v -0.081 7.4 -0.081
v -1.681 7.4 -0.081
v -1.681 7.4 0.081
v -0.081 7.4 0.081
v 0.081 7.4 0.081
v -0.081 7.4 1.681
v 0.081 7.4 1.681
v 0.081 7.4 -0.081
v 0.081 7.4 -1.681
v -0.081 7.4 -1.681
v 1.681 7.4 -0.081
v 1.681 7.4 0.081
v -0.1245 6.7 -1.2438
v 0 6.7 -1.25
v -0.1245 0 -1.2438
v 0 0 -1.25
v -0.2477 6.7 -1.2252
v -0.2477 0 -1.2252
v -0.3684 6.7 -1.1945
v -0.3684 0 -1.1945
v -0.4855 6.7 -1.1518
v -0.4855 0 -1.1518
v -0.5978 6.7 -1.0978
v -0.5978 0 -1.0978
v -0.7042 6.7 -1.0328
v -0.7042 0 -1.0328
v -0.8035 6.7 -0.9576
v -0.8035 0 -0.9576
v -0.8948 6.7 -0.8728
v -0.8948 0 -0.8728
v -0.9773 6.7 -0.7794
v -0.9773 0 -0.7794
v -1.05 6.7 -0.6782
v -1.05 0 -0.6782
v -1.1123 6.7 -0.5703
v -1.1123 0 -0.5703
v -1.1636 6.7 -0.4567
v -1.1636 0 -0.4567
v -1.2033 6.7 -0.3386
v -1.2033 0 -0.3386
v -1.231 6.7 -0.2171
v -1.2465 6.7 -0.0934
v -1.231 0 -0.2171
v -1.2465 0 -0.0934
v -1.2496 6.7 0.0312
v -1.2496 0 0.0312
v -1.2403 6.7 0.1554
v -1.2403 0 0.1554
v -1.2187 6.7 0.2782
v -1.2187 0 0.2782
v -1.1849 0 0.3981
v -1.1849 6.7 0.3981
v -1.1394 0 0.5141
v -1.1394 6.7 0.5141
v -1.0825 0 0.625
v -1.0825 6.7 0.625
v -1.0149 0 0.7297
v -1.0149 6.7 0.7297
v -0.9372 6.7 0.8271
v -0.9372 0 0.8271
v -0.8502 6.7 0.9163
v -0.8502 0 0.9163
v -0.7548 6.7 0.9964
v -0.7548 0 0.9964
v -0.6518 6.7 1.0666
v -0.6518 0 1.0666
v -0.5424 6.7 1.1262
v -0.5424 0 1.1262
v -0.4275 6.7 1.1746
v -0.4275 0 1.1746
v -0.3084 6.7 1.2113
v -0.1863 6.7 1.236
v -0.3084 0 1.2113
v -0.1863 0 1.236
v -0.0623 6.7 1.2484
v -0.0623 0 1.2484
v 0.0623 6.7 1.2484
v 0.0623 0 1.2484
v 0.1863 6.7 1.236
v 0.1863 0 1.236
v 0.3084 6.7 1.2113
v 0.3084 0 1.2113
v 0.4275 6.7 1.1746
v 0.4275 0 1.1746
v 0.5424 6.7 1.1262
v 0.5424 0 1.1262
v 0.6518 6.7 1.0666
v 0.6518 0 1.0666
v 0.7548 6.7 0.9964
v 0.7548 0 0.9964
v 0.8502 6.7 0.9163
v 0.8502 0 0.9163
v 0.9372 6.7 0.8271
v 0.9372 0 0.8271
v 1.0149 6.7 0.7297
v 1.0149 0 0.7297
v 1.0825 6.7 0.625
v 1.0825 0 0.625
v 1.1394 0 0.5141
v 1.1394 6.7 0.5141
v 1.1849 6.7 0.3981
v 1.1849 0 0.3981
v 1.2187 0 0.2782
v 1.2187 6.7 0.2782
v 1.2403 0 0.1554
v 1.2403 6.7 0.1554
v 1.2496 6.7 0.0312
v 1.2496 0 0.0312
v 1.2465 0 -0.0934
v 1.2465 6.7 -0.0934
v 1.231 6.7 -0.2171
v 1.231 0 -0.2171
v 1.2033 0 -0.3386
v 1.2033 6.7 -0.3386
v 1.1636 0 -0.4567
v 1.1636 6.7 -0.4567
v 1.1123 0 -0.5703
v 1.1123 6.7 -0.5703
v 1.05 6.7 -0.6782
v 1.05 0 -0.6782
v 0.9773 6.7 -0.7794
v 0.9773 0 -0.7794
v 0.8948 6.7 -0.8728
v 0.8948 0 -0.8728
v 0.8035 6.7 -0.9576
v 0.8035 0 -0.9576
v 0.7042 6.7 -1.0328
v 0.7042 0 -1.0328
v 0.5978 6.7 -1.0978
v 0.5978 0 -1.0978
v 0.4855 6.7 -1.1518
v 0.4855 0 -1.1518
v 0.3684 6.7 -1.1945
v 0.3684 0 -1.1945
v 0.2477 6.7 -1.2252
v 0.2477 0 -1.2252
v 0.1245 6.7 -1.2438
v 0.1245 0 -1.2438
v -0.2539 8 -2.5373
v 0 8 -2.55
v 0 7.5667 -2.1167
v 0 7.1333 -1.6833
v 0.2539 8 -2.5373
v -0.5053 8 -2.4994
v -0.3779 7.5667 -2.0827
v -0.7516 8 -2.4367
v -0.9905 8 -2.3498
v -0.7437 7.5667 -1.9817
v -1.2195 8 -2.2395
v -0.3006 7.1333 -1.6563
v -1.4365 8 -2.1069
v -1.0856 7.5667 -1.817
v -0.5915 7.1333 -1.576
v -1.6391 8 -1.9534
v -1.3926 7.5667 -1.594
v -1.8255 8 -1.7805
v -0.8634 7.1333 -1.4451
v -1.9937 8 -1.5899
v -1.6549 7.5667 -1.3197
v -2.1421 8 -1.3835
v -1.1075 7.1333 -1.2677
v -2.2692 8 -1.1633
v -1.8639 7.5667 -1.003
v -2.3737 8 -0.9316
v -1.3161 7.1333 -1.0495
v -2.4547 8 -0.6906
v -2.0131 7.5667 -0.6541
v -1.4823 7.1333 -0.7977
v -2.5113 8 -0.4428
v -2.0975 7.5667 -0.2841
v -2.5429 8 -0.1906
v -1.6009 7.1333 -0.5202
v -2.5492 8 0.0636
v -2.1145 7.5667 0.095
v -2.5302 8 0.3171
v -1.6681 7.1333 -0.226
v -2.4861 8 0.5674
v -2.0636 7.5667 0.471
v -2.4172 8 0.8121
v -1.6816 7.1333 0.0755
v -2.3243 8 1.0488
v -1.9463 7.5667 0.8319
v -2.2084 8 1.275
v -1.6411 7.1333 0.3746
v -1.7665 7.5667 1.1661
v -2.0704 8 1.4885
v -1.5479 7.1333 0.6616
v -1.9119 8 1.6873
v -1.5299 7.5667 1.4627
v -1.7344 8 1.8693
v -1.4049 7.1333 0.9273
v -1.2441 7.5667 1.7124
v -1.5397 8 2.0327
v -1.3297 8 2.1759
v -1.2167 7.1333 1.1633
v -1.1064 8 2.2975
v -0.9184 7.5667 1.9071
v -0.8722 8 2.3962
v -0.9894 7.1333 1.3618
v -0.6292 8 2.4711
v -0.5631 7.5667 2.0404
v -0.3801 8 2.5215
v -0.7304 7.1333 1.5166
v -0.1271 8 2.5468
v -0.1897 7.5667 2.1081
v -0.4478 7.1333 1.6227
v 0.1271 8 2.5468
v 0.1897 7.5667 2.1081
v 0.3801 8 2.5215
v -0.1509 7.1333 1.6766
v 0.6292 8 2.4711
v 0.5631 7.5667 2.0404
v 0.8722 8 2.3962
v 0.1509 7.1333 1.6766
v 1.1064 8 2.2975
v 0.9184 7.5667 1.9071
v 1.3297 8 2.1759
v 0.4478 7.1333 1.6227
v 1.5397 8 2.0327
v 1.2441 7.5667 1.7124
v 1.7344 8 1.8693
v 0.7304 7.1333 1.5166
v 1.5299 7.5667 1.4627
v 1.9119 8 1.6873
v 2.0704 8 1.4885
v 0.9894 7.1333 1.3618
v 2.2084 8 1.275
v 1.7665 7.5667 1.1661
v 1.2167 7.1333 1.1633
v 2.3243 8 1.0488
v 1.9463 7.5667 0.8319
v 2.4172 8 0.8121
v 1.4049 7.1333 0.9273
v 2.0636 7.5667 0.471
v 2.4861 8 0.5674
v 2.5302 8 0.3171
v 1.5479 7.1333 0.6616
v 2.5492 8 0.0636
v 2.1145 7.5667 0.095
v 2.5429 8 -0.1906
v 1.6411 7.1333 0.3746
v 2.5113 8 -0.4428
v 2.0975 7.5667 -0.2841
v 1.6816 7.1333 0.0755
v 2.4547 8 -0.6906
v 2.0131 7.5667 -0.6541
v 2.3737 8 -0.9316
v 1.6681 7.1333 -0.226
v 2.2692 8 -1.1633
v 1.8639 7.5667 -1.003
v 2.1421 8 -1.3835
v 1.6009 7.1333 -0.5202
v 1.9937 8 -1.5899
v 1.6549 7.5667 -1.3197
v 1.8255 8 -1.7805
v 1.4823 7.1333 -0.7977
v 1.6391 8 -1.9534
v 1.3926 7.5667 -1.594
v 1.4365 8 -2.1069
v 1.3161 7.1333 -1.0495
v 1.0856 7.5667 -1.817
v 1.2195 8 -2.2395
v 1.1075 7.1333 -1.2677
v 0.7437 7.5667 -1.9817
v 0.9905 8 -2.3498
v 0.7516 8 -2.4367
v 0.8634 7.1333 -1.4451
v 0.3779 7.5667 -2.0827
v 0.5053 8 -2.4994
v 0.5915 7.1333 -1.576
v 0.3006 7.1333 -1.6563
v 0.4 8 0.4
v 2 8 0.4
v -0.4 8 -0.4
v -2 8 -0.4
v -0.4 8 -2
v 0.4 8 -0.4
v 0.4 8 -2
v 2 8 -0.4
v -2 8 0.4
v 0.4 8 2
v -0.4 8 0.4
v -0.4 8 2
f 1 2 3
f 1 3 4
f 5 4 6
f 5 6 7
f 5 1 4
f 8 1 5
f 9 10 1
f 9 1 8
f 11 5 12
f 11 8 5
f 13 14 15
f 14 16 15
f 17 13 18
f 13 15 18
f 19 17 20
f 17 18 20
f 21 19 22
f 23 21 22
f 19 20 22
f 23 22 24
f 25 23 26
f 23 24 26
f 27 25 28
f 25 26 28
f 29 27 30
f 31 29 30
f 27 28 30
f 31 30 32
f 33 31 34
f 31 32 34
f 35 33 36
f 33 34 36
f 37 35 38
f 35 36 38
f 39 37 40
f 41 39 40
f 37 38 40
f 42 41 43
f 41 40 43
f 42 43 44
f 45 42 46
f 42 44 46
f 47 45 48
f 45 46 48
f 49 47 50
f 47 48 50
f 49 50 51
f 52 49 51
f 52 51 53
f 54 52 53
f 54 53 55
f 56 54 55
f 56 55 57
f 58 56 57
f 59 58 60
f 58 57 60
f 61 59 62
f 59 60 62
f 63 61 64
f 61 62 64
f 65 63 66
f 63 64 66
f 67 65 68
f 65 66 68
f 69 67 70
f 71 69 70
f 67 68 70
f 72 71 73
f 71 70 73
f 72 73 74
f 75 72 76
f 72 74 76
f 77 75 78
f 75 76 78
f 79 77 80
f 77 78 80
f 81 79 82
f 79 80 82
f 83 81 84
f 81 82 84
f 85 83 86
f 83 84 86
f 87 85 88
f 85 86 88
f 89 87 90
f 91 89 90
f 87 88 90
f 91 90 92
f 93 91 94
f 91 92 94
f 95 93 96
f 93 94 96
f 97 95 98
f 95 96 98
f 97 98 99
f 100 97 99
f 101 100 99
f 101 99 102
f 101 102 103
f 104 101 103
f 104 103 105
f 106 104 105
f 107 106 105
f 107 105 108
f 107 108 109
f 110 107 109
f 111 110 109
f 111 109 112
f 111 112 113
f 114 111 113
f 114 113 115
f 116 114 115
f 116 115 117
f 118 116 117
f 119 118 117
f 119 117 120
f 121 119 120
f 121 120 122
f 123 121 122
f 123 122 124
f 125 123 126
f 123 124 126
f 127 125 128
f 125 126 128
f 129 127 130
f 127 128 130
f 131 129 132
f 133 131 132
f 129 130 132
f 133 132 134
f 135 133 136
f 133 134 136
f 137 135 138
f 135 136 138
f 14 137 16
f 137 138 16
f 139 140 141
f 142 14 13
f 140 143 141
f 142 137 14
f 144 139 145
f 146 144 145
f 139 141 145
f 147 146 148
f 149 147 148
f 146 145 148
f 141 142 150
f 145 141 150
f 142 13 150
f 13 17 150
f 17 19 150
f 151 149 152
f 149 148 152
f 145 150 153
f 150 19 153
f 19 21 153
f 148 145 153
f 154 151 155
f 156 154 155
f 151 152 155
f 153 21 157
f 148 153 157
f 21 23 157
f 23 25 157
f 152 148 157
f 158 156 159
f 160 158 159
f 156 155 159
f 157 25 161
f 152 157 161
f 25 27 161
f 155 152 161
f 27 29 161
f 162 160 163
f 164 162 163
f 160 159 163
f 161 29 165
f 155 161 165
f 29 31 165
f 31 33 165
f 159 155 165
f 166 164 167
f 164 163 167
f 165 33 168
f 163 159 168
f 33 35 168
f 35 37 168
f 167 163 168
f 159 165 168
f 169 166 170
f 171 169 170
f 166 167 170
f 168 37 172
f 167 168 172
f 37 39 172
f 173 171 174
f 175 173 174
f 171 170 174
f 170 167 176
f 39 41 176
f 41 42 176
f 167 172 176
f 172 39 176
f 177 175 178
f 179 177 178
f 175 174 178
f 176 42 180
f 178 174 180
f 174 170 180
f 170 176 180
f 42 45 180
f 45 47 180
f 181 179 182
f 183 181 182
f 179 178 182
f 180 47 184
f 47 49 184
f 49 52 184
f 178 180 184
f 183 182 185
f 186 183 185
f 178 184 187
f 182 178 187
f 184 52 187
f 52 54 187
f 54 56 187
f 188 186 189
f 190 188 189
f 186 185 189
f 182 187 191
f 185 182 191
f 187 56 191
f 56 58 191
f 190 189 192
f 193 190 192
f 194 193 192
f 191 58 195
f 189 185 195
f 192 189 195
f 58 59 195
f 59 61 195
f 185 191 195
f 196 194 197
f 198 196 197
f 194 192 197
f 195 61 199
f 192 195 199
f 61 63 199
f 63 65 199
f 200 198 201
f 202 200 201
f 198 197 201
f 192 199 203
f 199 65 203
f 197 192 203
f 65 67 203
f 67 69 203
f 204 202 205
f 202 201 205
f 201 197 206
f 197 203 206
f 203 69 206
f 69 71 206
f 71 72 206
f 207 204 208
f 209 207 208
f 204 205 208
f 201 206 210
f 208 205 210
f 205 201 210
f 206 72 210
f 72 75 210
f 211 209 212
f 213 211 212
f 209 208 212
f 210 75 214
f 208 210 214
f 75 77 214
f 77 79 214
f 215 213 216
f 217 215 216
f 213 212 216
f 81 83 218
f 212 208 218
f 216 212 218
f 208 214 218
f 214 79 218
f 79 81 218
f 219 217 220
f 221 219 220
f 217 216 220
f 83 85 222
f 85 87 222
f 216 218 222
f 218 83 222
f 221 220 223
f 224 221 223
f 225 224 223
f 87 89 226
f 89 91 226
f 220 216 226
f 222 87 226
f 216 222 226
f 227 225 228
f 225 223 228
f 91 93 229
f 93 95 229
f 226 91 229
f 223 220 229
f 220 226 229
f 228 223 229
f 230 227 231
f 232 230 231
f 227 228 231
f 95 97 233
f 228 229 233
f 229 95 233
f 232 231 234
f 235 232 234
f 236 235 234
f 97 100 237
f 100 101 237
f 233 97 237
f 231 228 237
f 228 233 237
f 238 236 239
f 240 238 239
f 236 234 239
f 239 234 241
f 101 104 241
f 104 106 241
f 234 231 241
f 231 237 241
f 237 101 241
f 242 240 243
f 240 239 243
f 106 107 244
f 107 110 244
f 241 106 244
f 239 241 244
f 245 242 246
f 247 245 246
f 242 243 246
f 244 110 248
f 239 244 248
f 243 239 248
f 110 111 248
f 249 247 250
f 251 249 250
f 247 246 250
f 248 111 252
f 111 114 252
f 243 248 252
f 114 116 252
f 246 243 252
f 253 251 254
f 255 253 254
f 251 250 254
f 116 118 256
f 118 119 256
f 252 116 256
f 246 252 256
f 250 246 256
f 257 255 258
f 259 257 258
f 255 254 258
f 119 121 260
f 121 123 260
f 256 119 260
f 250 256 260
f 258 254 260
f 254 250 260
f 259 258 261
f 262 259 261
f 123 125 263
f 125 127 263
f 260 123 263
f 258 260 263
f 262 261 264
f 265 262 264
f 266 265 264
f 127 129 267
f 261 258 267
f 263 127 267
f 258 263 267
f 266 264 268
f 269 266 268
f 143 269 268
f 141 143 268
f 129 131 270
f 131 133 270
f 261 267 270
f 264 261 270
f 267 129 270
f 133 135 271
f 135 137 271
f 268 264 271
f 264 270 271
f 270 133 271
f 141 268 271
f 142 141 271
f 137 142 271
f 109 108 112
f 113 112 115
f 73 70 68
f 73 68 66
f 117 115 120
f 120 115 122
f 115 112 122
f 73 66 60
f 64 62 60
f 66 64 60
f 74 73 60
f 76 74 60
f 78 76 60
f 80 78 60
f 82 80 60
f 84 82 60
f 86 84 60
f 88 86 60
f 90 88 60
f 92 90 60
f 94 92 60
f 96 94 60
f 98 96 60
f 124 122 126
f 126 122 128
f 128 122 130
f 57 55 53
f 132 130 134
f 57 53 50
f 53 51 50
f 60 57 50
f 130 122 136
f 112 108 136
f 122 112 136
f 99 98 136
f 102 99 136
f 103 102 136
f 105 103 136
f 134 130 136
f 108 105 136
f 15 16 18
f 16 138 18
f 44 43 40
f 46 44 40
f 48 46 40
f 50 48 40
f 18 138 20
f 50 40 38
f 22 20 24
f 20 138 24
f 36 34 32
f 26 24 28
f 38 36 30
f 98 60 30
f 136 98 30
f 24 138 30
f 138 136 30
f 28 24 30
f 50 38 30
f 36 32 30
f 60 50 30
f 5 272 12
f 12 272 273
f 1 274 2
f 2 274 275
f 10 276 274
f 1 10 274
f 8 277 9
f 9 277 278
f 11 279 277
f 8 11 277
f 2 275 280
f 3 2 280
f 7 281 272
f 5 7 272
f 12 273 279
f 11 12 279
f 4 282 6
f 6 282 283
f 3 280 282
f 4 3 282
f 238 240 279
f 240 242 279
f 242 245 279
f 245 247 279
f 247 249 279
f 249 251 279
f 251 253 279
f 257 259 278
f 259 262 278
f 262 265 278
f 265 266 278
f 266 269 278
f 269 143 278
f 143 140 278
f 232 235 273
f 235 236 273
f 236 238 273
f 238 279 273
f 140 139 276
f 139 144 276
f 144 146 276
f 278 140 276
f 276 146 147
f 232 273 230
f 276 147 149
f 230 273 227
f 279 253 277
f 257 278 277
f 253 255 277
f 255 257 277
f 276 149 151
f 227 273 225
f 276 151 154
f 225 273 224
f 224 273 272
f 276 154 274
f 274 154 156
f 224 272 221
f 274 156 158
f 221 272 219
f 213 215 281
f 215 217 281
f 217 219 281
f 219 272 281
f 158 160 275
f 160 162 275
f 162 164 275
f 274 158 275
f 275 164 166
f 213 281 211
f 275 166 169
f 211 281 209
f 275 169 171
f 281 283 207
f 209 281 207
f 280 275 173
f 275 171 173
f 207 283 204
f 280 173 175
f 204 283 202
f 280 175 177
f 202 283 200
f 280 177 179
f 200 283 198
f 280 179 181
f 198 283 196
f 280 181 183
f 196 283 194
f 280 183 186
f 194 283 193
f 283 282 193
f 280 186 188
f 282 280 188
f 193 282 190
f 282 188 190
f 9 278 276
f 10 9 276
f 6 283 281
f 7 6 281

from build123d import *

# Parameters (mm, degrees)
CUT_EXTRUDE_1_DEPTH = 0.6
CUT_EXTRUDE_1_DRAFT = -28


with BuildPart() as part:
    # Эскиз1 → Повернуть1 (revolve)
    with BuildSketch(Plane.XY, mode=Mode.PRIVATE) as revolve_1_sk:
        Polygon((0, 8), (-2.55, 8), (-1.25, 6.7), (-1.25, 0), (0, 0), align=None)
    revolve(revolve_1_sk.sketch.rotate(Axis((0, 0, 0), (0, 1, 0)), 270), axis=Axis((0, 0, 0), (0, 1, 0)))


with BuildPart() as cut_extrude_1_tool:
    # Эскиз2 → Вырез-Вытянуть1 (with draft: the straight prism first)
    with BuildSketch(Plane(origin=(0, 8, 0), x_dir=(1, 0, 0), z_dir=(0, 1, 0))):
        Polygon((0.4, 0.4), (0.4, 2), (-0.4, 2), (-0.4, 0.4), (-2, 0.4), (-2, -0.4), (-0.4, -0.4), (-0.4, -2), (0.4, -2), (0.4, -0.4), (2, -0.4), (2, 0.4), align=None)
    extrude(amount=-CUT_EXTRUDE_1_DEPTH)
    # Вырез-Вытянуть1: the draft: its side faces are tilted about the plane it starts from
    cut_extrude_1_sides = [cut_extrude_1_tool.faces().sort_by_distance(p)[0] for p in [
        (0.4, 7.7, -1.2),
        (0, 7.7, -2),
        (-0.4, 7.7, -1.2),
        (-1.2, 7.7, -0.4),
        (-2, 7.7, 0),
        (-1.2, 7.7, 0.4),
        (-0.4, 7.7, 1.2),
        (0, 7.7, 2),
        (0.4, 7.7, 1.2),
        (1.2, 7.7, 0.4),
        (2, 7.7, 0),
        (1.2, 7.7, -0.4),
    ]]
    draft(cut_extrude_1_sides, Plane(origin=(0, 8, 0), x_dir=(1, 0, 0), z_dir=(0, 1, 0)), CUT_EXTRUDE_1_DRAFT)


with BuildPart() as part_1:
    add(part.part)

    # Вырез-Вытянуть1: cut by cut_extrude_1_tool
    add(cut_extrude_1_tool.part, mode=Mode.SUBTRACT)


solid = part_1.part
